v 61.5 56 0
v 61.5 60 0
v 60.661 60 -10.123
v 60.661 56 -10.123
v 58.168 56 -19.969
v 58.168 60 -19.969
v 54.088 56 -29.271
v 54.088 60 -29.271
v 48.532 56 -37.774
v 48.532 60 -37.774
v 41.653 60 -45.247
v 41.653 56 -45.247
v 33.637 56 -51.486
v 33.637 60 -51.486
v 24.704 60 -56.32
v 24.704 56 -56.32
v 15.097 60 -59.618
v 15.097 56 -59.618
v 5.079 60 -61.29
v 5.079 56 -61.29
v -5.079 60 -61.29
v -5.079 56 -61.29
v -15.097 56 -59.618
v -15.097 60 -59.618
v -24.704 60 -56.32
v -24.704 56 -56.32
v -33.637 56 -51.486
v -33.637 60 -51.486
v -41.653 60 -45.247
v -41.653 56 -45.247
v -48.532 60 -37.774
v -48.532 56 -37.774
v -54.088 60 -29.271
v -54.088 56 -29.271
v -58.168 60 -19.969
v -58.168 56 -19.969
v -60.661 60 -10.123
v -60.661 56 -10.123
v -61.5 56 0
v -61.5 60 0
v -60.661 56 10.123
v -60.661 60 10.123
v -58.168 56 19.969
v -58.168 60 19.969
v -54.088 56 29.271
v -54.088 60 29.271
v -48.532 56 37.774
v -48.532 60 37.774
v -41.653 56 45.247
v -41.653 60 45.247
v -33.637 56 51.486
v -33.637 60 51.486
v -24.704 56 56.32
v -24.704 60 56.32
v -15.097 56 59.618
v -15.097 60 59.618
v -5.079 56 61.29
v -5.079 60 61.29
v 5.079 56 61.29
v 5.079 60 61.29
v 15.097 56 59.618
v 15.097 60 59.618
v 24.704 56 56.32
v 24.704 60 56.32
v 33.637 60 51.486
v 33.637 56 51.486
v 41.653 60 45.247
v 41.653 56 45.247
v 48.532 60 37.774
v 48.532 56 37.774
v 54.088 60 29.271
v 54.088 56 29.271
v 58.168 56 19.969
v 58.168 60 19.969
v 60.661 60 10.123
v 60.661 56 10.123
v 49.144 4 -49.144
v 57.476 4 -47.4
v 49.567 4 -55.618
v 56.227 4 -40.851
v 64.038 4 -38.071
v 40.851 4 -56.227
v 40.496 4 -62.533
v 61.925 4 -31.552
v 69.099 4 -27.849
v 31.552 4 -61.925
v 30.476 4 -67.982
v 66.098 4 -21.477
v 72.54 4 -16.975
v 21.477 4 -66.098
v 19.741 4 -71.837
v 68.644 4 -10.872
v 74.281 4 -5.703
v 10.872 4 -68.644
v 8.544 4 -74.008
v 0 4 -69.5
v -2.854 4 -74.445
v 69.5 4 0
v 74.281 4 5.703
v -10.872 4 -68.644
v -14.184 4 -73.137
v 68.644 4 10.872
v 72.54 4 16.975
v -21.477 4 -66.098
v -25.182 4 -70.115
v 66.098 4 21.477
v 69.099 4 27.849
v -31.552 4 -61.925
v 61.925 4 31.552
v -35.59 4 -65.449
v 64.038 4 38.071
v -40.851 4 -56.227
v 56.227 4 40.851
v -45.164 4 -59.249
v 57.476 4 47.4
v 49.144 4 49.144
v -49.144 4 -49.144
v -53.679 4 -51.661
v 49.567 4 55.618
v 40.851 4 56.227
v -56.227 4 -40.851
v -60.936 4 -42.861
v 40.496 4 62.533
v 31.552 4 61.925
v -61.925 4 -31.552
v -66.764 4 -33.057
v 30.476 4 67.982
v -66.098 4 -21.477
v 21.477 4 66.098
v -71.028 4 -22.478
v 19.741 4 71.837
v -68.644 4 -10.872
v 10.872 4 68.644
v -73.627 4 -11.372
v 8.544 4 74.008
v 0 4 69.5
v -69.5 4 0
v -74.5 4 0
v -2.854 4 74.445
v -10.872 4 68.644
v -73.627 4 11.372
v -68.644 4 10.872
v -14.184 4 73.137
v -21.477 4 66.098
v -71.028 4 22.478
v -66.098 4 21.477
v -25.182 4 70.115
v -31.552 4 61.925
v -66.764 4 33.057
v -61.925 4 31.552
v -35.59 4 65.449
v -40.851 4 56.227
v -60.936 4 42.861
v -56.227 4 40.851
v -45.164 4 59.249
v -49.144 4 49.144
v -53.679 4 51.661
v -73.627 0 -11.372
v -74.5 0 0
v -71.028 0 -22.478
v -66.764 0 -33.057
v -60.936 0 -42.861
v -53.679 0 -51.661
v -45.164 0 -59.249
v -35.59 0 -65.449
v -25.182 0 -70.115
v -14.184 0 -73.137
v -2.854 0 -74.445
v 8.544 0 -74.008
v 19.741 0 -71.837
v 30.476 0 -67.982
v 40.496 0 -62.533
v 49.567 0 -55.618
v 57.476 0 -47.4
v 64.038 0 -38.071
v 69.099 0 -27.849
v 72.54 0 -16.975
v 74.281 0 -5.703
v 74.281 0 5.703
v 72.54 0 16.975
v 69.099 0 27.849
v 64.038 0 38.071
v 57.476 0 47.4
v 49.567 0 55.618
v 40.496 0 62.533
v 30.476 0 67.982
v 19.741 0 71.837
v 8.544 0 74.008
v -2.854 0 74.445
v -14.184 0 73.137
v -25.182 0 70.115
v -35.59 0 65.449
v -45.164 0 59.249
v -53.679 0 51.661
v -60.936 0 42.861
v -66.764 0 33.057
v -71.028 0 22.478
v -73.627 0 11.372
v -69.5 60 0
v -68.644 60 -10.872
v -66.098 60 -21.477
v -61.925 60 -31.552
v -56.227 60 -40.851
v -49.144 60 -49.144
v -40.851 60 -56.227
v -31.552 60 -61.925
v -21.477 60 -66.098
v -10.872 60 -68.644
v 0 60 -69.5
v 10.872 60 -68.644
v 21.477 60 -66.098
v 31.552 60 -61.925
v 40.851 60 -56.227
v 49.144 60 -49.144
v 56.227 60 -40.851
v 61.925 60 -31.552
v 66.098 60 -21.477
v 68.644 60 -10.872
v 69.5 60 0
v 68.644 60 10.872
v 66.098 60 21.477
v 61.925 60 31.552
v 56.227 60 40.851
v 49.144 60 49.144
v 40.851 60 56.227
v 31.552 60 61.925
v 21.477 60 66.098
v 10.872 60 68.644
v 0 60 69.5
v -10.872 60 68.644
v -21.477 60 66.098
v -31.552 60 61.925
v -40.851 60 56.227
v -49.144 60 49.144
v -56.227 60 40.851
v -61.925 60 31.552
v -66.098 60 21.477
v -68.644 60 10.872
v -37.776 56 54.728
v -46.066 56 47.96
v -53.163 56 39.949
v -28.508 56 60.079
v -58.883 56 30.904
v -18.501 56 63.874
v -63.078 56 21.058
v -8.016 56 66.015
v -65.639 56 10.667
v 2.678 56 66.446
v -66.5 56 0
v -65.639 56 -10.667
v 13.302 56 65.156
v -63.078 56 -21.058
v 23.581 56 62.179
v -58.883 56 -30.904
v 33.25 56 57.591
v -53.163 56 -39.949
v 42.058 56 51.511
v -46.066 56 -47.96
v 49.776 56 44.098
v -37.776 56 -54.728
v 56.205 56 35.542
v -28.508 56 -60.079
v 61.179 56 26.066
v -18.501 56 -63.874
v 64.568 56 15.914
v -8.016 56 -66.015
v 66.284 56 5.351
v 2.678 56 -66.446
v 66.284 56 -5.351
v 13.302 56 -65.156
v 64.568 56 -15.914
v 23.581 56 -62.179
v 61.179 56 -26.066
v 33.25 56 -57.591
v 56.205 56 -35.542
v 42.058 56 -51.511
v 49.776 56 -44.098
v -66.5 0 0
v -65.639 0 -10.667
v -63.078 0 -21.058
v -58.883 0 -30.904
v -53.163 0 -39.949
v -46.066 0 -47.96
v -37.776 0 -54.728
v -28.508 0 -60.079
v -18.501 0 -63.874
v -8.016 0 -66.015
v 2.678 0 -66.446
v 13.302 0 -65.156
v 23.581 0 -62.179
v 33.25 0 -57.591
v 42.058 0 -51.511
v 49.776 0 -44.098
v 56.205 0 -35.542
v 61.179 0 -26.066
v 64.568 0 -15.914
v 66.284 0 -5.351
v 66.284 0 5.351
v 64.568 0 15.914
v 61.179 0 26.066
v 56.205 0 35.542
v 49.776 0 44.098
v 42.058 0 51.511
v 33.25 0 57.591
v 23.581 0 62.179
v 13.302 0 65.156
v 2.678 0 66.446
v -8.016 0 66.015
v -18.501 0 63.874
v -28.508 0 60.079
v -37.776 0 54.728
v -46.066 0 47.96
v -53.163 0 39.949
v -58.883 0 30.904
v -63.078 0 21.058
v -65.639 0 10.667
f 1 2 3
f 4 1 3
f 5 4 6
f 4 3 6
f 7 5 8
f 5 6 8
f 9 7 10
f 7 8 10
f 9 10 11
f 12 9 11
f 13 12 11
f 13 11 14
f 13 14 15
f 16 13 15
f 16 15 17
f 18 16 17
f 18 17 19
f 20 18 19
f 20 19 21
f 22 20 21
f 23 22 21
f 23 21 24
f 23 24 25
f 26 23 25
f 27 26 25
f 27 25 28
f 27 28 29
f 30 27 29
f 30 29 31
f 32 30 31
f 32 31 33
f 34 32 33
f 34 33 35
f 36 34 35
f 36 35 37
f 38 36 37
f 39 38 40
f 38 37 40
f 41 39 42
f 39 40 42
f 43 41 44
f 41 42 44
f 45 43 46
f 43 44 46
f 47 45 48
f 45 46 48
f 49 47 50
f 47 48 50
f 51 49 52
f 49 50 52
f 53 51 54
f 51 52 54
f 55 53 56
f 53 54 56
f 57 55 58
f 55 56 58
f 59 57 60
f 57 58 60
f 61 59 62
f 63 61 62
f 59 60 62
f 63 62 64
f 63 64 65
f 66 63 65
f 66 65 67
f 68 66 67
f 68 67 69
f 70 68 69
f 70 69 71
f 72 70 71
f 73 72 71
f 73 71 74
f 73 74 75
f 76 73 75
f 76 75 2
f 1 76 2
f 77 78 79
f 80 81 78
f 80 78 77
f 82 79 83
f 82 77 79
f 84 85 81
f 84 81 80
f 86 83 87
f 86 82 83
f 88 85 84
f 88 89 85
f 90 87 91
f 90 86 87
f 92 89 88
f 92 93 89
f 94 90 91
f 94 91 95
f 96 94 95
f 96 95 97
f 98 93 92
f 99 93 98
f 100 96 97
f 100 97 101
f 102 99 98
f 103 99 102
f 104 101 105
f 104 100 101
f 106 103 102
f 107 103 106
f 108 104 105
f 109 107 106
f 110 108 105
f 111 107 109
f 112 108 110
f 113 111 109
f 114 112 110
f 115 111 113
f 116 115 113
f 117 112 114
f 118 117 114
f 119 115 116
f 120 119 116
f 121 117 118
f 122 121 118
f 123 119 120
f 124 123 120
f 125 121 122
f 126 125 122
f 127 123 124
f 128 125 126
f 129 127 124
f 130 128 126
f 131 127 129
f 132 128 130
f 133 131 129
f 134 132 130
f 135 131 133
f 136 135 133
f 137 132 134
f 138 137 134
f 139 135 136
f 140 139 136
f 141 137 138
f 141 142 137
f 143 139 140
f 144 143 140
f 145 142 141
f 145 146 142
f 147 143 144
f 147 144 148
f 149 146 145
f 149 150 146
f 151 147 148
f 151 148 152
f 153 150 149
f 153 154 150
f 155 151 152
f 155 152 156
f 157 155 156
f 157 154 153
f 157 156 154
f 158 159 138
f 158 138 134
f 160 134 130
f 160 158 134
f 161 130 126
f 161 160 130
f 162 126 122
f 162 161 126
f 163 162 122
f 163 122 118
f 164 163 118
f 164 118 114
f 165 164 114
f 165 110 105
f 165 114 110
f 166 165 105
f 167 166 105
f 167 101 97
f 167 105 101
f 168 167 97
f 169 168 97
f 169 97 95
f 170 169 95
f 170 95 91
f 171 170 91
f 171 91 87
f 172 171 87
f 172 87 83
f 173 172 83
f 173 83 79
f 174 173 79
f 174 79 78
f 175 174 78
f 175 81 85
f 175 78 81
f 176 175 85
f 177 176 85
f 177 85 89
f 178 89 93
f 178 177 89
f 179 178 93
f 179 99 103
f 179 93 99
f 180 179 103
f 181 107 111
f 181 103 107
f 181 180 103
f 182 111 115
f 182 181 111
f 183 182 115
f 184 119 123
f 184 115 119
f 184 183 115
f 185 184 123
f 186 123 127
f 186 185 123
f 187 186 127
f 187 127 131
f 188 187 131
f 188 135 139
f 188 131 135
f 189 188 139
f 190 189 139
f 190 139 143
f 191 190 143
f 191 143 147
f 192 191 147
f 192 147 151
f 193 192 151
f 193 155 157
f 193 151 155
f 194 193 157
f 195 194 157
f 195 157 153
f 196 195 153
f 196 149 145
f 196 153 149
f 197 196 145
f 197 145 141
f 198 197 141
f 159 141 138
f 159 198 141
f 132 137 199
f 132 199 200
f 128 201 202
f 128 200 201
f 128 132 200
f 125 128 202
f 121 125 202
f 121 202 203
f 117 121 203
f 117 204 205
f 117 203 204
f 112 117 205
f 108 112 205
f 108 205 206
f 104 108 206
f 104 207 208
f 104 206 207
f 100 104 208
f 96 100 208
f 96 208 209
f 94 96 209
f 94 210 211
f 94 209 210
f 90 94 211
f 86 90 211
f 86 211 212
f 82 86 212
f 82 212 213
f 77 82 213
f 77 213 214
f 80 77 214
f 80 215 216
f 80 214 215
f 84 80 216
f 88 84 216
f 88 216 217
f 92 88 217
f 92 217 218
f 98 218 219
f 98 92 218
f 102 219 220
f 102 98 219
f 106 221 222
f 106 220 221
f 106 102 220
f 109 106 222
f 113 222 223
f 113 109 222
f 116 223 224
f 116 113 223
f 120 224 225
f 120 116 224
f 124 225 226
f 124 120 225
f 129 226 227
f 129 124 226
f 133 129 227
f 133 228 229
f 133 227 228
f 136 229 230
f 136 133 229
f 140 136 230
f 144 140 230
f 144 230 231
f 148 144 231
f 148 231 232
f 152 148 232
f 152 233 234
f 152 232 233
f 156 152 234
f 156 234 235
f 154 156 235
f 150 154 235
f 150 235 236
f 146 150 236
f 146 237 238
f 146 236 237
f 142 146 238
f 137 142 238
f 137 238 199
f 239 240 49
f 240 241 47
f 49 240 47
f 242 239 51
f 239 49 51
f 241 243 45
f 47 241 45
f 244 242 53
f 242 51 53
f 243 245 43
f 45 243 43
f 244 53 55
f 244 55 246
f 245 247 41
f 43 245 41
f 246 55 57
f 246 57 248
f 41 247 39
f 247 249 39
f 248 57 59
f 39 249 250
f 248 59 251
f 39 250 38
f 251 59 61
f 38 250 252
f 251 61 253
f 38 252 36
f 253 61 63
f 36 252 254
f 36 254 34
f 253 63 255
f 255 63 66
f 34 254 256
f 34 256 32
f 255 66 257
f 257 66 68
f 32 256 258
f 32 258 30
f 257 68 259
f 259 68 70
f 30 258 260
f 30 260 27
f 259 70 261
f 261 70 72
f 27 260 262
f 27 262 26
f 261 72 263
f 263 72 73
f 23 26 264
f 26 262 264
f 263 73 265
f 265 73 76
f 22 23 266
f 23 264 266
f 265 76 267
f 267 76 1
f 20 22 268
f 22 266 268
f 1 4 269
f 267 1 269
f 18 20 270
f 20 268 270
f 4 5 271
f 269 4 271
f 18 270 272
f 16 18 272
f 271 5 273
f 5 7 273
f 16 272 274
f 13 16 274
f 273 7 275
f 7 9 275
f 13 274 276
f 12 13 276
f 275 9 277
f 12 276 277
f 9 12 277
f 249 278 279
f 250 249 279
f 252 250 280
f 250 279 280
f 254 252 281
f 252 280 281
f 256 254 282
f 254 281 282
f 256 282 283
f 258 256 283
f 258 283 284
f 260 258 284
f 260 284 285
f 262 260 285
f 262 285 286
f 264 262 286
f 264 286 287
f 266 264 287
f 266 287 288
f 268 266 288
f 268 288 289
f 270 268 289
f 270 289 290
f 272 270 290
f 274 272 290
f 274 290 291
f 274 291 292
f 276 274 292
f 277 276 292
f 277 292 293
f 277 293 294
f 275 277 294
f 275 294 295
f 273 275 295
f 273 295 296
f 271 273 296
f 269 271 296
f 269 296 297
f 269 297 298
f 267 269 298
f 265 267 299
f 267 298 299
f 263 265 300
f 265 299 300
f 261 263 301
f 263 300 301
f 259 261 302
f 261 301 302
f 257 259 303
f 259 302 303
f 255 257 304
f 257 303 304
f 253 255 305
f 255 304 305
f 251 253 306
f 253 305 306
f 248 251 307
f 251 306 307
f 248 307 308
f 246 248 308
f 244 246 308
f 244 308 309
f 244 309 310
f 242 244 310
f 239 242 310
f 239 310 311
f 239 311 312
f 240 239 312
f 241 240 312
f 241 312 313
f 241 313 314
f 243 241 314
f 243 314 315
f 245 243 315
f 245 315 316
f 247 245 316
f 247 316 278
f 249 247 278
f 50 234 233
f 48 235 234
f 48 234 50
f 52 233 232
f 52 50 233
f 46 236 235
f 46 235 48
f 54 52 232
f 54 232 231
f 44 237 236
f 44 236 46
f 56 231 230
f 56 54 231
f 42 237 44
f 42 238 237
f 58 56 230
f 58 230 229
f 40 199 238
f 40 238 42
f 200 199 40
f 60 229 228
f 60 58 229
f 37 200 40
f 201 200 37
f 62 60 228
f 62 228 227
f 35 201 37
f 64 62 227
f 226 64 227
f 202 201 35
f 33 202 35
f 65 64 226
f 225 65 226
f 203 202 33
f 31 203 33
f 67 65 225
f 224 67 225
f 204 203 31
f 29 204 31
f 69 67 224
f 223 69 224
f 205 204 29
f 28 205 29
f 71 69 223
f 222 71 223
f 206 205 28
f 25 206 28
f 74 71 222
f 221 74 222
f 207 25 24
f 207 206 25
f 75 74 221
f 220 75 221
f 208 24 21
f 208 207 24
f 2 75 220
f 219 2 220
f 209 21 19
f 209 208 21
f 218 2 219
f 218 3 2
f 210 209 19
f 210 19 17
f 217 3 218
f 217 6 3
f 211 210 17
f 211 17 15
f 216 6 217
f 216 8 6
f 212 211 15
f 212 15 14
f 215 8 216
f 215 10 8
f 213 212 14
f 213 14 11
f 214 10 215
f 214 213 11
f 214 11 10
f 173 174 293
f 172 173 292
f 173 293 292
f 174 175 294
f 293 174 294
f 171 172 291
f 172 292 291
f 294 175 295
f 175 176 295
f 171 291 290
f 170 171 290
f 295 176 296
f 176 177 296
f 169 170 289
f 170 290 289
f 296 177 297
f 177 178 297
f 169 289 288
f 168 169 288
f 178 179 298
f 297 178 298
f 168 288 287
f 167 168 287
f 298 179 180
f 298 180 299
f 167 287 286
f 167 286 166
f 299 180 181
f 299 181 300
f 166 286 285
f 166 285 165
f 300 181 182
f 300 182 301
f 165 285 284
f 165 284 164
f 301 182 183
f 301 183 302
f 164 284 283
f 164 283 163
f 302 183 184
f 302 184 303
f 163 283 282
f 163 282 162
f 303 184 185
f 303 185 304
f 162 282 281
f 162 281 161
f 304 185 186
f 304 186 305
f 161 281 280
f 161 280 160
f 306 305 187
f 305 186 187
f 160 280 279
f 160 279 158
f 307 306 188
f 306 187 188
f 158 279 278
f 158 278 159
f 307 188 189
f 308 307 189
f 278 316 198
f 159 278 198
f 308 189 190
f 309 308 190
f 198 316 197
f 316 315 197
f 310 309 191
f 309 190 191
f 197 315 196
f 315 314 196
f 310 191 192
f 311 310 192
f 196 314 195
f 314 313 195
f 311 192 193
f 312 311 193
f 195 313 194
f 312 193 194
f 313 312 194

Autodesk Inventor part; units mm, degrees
ref_plane "YZ Plane" through (0, 0, 0) normal (1, 0, 0) x (0, 1, 0)
ref_plane "XZ Plane" through (0, 0, 0) normal (0, 1, 0) x (-1, 0, 0)
sketch "Sketch1" plane through (0, 0, 0) normal (0, 1, 0) x (-1, 0, 0)
  circle A0 centre (0, 0) radius 74.5
  circle A1 centre (0, 0) radius 69.5
  circle A2 centre (0, 0) radius 66.5
  dimension "Absolute_Diameter" = 149
  dimension "Diameter_No_Outer_Lip" = 139
  dimension "Inner_Cylinder_Diameter" = 133
extrude "Extrusion1" add sketch "Sketch1" along normal blind 4 contours A0
extrude "Extrusion2" add sketch "Sketch1" along normal blind 60 contours A1
sketch "Sketch2" plane through (0, 60, 0) normal (0, 1, 0) x (1, 0, 0)
  circle A0 centre (0, 0) radius 61.5
  circle A1 centre (0, 0) radius 66.5
  dimension "Lip_Diameter_Out" = 123
  dimension "Top_Outer_Lip_Diameter" = 133
extrude "Extrusion7" add sketch "Sketch2" against normal blind 4
ref_plane "Work Plane2" through (0, 10, 0) normal (0, 1, 0) x (1, 0, 0)
sketch "Sketch3" plane through (0, 10, 0) normal (0, 1, 0) x (1, 0, 0)
  circle A0 centre (0, 0) radius 127.5
  circle A1 centre (-127.5, 0) radius 2.5
  circle A2 centre (-103.1497, -74.9426) radius 2.5
  circle A3 centre (-39.3997, -121.2597) radius 2.5
  circle A4 centre (39.3997, -121.2597) radius 2.5
  circle A5 centre (103.1497, -74.9426) radius 2.5
  circle A6 centre (127.5, 0) radius 2.5
  circle A7 centre (103.1497, 74.9426) radius 2.5
  circle A8 centre (39.3997, 121.2597) radius 2.5
  circle A9 centre (-39.3997, 121.2597) radius 2.5
  circle A10 centre (-103.1497, 74.9426) radius 2.5
  dimension "d27" = 255
  dimension "d28" = 5
  dimension "d31" = 360
extrude "Extrusion8" [suppressed]
sketch "Sketch24" plane through (0, 60, 0) normal (0, 1, 0) x (1, 0, 0)
  circle A0 centre (0, 0) radius 51
  circle A1 centre (0, -51) radius 2.75
  circle A2 centre (44.1673, -25.5) radius 2.75
  circle A3 centre (44.1673, 25.5) radius 2.75
  circle A4 centre (0, 51) radius 2.75
  circle A5 centre (-44.1673, 25.5) radius 2.75
  circle A6 centre (-44.1673, -25.5) radius 2.75
  dimension "d230" = 102
  dimension "d231" = 5.5
  dimension "d234" = 360
extrude "Extrusion30" [suppressed]
sketch "Sketch25" plane through (0, 60, 0) normal (0, 1, 0) x (1, 0, 0)
  point P0 (0, 0)
sketch "Sketch26" plane through (0, 60, 0) normal (0, 1, 0) x (1, 0, 0)
  circle A0 centre (-44.1673, 25.5) radius 2.75 projected
  circle A1 centre (0, 0) radius 51
  circle A2 centre (-51, 0) radius 3.25
  circle A3 centre (-25.5, -44.1673) radius 3.25
  circle A4 centre (25.5, -44.1673) radius 3.25
  circle A5 centre (51, 0) radius 3.25
  circle A6 centre (25.5, 44.1673) radius 3.25
  circle A7 centre (-25.5, 44.1673) radius 3.25
  dimension "d239" = 6.5
  dimension "d242" = 360
extrude "Extrusion31" [suppressed]
properties part number "Cylinder Replacement- 10"
